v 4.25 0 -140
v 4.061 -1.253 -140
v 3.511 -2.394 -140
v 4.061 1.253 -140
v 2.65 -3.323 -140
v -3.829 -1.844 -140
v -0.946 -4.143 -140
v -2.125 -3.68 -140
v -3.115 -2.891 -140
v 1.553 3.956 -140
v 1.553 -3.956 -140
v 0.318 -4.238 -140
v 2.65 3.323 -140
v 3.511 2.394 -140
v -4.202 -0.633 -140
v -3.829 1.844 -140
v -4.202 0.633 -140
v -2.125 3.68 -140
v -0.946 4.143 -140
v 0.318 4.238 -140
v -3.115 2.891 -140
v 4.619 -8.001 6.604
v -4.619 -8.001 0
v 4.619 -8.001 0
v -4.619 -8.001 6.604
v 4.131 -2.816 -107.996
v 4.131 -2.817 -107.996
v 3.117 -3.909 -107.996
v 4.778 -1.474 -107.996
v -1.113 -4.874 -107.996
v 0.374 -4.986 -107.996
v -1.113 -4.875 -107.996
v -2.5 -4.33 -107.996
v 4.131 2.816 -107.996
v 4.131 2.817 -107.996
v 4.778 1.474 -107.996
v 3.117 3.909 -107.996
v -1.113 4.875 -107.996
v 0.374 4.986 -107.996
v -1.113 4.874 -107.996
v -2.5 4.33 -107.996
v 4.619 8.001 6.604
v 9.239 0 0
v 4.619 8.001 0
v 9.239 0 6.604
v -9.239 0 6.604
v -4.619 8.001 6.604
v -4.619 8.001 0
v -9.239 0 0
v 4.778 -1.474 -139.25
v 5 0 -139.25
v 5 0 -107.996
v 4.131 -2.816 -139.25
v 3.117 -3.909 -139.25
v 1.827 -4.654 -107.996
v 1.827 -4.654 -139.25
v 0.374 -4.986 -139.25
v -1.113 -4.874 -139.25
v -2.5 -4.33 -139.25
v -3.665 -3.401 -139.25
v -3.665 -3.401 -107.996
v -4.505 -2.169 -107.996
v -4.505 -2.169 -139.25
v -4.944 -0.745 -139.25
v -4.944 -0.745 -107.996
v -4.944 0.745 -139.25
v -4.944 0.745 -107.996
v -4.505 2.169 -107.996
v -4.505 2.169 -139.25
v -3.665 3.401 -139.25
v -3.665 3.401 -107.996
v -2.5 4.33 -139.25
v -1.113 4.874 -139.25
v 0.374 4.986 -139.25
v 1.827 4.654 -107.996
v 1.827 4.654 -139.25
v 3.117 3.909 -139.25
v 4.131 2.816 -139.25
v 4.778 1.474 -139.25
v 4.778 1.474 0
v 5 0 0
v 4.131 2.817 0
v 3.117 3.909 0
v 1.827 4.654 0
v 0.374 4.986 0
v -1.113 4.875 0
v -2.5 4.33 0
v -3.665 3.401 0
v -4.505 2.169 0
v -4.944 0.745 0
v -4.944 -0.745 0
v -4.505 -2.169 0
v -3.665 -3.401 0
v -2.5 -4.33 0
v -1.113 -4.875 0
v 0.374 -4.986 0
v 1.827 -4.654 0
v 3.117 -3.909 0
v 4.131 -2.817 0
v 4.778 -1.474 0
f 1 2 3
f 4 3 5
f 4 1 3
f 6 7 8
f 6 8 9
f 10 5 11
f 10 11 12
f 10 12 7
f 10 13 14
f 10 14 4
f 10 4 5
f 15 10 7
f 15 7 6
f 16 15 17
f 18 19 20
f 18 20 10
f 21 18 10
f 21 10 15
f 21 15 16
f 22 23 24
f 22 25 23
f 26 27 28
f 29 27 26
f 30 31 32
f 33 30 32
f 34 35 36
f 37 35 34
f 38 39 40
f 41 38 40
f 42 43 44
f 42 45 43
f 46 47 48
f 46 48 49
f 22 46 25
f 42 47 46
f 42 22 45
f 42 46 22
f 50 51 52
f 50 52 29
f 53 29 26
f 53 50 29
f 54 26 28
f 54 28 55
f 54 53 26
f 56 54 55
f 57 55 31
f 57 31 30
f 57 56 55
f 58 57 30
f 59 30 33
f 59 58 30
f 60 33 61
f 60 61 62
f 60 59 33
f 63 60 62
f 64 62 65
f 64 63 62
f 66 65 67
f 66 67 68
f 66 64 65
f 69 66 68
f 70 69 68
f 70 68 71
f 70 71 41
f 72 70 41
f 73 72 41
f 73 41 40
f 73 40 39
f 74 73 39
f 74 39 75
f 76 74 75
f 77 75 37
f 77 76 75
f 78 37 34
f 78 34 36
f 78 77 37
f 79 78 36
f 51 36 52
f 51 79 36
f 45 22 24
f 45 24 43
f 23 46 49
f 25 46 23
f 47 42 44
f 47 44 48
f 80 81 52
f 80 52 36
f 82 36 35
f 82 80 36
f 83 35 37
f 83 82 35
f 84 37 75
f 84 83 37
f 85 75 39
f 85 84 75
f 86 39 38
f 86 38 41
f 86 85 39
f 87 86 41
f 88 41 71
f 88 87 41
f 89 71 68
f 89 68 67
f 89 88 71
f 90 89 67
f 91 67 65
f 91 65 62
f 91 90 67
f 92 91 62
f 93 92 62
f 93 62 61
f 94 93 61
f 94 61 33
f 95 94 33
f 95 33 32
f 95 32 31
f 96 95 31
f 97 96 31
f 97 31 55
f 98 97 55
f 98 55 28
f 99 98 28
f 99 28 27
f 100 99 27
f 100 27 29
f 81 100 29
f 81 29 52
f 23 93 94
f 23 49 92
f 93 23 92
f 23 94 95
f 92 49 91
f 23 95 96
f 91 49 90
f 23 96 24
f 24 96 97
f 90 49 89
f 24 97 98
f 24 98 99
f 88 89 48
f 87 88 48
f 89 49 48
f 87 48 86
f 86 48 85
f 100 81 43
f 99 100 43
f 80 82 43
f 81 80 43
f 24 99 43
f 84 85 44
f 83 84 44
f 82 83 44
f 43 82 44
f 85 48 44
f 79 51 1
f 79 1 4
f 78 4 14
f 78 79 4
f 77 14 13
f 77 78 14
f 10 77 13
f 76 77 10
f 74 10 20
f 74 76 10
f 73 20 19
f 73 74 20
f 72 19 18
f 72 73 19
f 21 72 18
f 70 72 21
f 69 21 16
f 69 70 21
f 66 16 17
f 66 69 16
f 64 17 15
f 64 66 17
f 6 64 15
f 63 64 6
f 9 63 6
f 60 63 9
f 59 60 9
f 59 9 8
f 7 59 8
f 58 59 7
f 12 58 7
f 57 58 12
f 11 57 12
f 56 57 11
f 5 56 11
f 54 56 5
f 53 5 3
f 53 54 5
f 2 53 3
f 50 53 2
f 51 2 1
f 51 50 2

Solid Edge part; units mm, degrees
sketch "Sketch1" plane through (0, 0, 0) normal (0, 0, 1) x (1, 0, 0)
  circle A0 centre (0, 0) radius 9.2812
  dimension "D1" = 18.5623
extrude "Protrusion1" add sketch "Sketch1" along normal blind 6.604
sketch "Sketch2" plane through (0, 0, 0) normal (0, 0, -1) x (1, 0, 0)
  circle A0 centre (0, 0) radius 5
extrude "Protrusion2" add sketch "Sketch2" along normal blind 140
sketch "Sketch3" plane through (0, 0, -140) normal (0, 0, -1) x (1, 0, 0)
  circle A0 centre (0, 0) radius 4.9997
extrude "Cutout1" cut sketch "Sketch3" against normal blind 32.004 flip side to cut
chamfer "Chamfer_1" distance 0.75 angle 45 1 edges at (-4.9997, 0, -140)
sketch "Sketch4" plane through (0, 0, 6.604) normal (0, 0, 1) x (1, 0, 0)
  line L0 (-4.7036, 8.001) -> (4.7036, 8.001)
  dimension "D1" = 16.002
extrude "Cutout2" cut sketch "Sketch4" against normal up to next material side at (0, 8.051, 6.604)
pattern_circular "Pattern1" count 6 over 360 about axis through (0, 0, 6.604) along (0, 0, 1) of "Cutout2"
properties part number "118010" material "Stainless Steel, 304"
